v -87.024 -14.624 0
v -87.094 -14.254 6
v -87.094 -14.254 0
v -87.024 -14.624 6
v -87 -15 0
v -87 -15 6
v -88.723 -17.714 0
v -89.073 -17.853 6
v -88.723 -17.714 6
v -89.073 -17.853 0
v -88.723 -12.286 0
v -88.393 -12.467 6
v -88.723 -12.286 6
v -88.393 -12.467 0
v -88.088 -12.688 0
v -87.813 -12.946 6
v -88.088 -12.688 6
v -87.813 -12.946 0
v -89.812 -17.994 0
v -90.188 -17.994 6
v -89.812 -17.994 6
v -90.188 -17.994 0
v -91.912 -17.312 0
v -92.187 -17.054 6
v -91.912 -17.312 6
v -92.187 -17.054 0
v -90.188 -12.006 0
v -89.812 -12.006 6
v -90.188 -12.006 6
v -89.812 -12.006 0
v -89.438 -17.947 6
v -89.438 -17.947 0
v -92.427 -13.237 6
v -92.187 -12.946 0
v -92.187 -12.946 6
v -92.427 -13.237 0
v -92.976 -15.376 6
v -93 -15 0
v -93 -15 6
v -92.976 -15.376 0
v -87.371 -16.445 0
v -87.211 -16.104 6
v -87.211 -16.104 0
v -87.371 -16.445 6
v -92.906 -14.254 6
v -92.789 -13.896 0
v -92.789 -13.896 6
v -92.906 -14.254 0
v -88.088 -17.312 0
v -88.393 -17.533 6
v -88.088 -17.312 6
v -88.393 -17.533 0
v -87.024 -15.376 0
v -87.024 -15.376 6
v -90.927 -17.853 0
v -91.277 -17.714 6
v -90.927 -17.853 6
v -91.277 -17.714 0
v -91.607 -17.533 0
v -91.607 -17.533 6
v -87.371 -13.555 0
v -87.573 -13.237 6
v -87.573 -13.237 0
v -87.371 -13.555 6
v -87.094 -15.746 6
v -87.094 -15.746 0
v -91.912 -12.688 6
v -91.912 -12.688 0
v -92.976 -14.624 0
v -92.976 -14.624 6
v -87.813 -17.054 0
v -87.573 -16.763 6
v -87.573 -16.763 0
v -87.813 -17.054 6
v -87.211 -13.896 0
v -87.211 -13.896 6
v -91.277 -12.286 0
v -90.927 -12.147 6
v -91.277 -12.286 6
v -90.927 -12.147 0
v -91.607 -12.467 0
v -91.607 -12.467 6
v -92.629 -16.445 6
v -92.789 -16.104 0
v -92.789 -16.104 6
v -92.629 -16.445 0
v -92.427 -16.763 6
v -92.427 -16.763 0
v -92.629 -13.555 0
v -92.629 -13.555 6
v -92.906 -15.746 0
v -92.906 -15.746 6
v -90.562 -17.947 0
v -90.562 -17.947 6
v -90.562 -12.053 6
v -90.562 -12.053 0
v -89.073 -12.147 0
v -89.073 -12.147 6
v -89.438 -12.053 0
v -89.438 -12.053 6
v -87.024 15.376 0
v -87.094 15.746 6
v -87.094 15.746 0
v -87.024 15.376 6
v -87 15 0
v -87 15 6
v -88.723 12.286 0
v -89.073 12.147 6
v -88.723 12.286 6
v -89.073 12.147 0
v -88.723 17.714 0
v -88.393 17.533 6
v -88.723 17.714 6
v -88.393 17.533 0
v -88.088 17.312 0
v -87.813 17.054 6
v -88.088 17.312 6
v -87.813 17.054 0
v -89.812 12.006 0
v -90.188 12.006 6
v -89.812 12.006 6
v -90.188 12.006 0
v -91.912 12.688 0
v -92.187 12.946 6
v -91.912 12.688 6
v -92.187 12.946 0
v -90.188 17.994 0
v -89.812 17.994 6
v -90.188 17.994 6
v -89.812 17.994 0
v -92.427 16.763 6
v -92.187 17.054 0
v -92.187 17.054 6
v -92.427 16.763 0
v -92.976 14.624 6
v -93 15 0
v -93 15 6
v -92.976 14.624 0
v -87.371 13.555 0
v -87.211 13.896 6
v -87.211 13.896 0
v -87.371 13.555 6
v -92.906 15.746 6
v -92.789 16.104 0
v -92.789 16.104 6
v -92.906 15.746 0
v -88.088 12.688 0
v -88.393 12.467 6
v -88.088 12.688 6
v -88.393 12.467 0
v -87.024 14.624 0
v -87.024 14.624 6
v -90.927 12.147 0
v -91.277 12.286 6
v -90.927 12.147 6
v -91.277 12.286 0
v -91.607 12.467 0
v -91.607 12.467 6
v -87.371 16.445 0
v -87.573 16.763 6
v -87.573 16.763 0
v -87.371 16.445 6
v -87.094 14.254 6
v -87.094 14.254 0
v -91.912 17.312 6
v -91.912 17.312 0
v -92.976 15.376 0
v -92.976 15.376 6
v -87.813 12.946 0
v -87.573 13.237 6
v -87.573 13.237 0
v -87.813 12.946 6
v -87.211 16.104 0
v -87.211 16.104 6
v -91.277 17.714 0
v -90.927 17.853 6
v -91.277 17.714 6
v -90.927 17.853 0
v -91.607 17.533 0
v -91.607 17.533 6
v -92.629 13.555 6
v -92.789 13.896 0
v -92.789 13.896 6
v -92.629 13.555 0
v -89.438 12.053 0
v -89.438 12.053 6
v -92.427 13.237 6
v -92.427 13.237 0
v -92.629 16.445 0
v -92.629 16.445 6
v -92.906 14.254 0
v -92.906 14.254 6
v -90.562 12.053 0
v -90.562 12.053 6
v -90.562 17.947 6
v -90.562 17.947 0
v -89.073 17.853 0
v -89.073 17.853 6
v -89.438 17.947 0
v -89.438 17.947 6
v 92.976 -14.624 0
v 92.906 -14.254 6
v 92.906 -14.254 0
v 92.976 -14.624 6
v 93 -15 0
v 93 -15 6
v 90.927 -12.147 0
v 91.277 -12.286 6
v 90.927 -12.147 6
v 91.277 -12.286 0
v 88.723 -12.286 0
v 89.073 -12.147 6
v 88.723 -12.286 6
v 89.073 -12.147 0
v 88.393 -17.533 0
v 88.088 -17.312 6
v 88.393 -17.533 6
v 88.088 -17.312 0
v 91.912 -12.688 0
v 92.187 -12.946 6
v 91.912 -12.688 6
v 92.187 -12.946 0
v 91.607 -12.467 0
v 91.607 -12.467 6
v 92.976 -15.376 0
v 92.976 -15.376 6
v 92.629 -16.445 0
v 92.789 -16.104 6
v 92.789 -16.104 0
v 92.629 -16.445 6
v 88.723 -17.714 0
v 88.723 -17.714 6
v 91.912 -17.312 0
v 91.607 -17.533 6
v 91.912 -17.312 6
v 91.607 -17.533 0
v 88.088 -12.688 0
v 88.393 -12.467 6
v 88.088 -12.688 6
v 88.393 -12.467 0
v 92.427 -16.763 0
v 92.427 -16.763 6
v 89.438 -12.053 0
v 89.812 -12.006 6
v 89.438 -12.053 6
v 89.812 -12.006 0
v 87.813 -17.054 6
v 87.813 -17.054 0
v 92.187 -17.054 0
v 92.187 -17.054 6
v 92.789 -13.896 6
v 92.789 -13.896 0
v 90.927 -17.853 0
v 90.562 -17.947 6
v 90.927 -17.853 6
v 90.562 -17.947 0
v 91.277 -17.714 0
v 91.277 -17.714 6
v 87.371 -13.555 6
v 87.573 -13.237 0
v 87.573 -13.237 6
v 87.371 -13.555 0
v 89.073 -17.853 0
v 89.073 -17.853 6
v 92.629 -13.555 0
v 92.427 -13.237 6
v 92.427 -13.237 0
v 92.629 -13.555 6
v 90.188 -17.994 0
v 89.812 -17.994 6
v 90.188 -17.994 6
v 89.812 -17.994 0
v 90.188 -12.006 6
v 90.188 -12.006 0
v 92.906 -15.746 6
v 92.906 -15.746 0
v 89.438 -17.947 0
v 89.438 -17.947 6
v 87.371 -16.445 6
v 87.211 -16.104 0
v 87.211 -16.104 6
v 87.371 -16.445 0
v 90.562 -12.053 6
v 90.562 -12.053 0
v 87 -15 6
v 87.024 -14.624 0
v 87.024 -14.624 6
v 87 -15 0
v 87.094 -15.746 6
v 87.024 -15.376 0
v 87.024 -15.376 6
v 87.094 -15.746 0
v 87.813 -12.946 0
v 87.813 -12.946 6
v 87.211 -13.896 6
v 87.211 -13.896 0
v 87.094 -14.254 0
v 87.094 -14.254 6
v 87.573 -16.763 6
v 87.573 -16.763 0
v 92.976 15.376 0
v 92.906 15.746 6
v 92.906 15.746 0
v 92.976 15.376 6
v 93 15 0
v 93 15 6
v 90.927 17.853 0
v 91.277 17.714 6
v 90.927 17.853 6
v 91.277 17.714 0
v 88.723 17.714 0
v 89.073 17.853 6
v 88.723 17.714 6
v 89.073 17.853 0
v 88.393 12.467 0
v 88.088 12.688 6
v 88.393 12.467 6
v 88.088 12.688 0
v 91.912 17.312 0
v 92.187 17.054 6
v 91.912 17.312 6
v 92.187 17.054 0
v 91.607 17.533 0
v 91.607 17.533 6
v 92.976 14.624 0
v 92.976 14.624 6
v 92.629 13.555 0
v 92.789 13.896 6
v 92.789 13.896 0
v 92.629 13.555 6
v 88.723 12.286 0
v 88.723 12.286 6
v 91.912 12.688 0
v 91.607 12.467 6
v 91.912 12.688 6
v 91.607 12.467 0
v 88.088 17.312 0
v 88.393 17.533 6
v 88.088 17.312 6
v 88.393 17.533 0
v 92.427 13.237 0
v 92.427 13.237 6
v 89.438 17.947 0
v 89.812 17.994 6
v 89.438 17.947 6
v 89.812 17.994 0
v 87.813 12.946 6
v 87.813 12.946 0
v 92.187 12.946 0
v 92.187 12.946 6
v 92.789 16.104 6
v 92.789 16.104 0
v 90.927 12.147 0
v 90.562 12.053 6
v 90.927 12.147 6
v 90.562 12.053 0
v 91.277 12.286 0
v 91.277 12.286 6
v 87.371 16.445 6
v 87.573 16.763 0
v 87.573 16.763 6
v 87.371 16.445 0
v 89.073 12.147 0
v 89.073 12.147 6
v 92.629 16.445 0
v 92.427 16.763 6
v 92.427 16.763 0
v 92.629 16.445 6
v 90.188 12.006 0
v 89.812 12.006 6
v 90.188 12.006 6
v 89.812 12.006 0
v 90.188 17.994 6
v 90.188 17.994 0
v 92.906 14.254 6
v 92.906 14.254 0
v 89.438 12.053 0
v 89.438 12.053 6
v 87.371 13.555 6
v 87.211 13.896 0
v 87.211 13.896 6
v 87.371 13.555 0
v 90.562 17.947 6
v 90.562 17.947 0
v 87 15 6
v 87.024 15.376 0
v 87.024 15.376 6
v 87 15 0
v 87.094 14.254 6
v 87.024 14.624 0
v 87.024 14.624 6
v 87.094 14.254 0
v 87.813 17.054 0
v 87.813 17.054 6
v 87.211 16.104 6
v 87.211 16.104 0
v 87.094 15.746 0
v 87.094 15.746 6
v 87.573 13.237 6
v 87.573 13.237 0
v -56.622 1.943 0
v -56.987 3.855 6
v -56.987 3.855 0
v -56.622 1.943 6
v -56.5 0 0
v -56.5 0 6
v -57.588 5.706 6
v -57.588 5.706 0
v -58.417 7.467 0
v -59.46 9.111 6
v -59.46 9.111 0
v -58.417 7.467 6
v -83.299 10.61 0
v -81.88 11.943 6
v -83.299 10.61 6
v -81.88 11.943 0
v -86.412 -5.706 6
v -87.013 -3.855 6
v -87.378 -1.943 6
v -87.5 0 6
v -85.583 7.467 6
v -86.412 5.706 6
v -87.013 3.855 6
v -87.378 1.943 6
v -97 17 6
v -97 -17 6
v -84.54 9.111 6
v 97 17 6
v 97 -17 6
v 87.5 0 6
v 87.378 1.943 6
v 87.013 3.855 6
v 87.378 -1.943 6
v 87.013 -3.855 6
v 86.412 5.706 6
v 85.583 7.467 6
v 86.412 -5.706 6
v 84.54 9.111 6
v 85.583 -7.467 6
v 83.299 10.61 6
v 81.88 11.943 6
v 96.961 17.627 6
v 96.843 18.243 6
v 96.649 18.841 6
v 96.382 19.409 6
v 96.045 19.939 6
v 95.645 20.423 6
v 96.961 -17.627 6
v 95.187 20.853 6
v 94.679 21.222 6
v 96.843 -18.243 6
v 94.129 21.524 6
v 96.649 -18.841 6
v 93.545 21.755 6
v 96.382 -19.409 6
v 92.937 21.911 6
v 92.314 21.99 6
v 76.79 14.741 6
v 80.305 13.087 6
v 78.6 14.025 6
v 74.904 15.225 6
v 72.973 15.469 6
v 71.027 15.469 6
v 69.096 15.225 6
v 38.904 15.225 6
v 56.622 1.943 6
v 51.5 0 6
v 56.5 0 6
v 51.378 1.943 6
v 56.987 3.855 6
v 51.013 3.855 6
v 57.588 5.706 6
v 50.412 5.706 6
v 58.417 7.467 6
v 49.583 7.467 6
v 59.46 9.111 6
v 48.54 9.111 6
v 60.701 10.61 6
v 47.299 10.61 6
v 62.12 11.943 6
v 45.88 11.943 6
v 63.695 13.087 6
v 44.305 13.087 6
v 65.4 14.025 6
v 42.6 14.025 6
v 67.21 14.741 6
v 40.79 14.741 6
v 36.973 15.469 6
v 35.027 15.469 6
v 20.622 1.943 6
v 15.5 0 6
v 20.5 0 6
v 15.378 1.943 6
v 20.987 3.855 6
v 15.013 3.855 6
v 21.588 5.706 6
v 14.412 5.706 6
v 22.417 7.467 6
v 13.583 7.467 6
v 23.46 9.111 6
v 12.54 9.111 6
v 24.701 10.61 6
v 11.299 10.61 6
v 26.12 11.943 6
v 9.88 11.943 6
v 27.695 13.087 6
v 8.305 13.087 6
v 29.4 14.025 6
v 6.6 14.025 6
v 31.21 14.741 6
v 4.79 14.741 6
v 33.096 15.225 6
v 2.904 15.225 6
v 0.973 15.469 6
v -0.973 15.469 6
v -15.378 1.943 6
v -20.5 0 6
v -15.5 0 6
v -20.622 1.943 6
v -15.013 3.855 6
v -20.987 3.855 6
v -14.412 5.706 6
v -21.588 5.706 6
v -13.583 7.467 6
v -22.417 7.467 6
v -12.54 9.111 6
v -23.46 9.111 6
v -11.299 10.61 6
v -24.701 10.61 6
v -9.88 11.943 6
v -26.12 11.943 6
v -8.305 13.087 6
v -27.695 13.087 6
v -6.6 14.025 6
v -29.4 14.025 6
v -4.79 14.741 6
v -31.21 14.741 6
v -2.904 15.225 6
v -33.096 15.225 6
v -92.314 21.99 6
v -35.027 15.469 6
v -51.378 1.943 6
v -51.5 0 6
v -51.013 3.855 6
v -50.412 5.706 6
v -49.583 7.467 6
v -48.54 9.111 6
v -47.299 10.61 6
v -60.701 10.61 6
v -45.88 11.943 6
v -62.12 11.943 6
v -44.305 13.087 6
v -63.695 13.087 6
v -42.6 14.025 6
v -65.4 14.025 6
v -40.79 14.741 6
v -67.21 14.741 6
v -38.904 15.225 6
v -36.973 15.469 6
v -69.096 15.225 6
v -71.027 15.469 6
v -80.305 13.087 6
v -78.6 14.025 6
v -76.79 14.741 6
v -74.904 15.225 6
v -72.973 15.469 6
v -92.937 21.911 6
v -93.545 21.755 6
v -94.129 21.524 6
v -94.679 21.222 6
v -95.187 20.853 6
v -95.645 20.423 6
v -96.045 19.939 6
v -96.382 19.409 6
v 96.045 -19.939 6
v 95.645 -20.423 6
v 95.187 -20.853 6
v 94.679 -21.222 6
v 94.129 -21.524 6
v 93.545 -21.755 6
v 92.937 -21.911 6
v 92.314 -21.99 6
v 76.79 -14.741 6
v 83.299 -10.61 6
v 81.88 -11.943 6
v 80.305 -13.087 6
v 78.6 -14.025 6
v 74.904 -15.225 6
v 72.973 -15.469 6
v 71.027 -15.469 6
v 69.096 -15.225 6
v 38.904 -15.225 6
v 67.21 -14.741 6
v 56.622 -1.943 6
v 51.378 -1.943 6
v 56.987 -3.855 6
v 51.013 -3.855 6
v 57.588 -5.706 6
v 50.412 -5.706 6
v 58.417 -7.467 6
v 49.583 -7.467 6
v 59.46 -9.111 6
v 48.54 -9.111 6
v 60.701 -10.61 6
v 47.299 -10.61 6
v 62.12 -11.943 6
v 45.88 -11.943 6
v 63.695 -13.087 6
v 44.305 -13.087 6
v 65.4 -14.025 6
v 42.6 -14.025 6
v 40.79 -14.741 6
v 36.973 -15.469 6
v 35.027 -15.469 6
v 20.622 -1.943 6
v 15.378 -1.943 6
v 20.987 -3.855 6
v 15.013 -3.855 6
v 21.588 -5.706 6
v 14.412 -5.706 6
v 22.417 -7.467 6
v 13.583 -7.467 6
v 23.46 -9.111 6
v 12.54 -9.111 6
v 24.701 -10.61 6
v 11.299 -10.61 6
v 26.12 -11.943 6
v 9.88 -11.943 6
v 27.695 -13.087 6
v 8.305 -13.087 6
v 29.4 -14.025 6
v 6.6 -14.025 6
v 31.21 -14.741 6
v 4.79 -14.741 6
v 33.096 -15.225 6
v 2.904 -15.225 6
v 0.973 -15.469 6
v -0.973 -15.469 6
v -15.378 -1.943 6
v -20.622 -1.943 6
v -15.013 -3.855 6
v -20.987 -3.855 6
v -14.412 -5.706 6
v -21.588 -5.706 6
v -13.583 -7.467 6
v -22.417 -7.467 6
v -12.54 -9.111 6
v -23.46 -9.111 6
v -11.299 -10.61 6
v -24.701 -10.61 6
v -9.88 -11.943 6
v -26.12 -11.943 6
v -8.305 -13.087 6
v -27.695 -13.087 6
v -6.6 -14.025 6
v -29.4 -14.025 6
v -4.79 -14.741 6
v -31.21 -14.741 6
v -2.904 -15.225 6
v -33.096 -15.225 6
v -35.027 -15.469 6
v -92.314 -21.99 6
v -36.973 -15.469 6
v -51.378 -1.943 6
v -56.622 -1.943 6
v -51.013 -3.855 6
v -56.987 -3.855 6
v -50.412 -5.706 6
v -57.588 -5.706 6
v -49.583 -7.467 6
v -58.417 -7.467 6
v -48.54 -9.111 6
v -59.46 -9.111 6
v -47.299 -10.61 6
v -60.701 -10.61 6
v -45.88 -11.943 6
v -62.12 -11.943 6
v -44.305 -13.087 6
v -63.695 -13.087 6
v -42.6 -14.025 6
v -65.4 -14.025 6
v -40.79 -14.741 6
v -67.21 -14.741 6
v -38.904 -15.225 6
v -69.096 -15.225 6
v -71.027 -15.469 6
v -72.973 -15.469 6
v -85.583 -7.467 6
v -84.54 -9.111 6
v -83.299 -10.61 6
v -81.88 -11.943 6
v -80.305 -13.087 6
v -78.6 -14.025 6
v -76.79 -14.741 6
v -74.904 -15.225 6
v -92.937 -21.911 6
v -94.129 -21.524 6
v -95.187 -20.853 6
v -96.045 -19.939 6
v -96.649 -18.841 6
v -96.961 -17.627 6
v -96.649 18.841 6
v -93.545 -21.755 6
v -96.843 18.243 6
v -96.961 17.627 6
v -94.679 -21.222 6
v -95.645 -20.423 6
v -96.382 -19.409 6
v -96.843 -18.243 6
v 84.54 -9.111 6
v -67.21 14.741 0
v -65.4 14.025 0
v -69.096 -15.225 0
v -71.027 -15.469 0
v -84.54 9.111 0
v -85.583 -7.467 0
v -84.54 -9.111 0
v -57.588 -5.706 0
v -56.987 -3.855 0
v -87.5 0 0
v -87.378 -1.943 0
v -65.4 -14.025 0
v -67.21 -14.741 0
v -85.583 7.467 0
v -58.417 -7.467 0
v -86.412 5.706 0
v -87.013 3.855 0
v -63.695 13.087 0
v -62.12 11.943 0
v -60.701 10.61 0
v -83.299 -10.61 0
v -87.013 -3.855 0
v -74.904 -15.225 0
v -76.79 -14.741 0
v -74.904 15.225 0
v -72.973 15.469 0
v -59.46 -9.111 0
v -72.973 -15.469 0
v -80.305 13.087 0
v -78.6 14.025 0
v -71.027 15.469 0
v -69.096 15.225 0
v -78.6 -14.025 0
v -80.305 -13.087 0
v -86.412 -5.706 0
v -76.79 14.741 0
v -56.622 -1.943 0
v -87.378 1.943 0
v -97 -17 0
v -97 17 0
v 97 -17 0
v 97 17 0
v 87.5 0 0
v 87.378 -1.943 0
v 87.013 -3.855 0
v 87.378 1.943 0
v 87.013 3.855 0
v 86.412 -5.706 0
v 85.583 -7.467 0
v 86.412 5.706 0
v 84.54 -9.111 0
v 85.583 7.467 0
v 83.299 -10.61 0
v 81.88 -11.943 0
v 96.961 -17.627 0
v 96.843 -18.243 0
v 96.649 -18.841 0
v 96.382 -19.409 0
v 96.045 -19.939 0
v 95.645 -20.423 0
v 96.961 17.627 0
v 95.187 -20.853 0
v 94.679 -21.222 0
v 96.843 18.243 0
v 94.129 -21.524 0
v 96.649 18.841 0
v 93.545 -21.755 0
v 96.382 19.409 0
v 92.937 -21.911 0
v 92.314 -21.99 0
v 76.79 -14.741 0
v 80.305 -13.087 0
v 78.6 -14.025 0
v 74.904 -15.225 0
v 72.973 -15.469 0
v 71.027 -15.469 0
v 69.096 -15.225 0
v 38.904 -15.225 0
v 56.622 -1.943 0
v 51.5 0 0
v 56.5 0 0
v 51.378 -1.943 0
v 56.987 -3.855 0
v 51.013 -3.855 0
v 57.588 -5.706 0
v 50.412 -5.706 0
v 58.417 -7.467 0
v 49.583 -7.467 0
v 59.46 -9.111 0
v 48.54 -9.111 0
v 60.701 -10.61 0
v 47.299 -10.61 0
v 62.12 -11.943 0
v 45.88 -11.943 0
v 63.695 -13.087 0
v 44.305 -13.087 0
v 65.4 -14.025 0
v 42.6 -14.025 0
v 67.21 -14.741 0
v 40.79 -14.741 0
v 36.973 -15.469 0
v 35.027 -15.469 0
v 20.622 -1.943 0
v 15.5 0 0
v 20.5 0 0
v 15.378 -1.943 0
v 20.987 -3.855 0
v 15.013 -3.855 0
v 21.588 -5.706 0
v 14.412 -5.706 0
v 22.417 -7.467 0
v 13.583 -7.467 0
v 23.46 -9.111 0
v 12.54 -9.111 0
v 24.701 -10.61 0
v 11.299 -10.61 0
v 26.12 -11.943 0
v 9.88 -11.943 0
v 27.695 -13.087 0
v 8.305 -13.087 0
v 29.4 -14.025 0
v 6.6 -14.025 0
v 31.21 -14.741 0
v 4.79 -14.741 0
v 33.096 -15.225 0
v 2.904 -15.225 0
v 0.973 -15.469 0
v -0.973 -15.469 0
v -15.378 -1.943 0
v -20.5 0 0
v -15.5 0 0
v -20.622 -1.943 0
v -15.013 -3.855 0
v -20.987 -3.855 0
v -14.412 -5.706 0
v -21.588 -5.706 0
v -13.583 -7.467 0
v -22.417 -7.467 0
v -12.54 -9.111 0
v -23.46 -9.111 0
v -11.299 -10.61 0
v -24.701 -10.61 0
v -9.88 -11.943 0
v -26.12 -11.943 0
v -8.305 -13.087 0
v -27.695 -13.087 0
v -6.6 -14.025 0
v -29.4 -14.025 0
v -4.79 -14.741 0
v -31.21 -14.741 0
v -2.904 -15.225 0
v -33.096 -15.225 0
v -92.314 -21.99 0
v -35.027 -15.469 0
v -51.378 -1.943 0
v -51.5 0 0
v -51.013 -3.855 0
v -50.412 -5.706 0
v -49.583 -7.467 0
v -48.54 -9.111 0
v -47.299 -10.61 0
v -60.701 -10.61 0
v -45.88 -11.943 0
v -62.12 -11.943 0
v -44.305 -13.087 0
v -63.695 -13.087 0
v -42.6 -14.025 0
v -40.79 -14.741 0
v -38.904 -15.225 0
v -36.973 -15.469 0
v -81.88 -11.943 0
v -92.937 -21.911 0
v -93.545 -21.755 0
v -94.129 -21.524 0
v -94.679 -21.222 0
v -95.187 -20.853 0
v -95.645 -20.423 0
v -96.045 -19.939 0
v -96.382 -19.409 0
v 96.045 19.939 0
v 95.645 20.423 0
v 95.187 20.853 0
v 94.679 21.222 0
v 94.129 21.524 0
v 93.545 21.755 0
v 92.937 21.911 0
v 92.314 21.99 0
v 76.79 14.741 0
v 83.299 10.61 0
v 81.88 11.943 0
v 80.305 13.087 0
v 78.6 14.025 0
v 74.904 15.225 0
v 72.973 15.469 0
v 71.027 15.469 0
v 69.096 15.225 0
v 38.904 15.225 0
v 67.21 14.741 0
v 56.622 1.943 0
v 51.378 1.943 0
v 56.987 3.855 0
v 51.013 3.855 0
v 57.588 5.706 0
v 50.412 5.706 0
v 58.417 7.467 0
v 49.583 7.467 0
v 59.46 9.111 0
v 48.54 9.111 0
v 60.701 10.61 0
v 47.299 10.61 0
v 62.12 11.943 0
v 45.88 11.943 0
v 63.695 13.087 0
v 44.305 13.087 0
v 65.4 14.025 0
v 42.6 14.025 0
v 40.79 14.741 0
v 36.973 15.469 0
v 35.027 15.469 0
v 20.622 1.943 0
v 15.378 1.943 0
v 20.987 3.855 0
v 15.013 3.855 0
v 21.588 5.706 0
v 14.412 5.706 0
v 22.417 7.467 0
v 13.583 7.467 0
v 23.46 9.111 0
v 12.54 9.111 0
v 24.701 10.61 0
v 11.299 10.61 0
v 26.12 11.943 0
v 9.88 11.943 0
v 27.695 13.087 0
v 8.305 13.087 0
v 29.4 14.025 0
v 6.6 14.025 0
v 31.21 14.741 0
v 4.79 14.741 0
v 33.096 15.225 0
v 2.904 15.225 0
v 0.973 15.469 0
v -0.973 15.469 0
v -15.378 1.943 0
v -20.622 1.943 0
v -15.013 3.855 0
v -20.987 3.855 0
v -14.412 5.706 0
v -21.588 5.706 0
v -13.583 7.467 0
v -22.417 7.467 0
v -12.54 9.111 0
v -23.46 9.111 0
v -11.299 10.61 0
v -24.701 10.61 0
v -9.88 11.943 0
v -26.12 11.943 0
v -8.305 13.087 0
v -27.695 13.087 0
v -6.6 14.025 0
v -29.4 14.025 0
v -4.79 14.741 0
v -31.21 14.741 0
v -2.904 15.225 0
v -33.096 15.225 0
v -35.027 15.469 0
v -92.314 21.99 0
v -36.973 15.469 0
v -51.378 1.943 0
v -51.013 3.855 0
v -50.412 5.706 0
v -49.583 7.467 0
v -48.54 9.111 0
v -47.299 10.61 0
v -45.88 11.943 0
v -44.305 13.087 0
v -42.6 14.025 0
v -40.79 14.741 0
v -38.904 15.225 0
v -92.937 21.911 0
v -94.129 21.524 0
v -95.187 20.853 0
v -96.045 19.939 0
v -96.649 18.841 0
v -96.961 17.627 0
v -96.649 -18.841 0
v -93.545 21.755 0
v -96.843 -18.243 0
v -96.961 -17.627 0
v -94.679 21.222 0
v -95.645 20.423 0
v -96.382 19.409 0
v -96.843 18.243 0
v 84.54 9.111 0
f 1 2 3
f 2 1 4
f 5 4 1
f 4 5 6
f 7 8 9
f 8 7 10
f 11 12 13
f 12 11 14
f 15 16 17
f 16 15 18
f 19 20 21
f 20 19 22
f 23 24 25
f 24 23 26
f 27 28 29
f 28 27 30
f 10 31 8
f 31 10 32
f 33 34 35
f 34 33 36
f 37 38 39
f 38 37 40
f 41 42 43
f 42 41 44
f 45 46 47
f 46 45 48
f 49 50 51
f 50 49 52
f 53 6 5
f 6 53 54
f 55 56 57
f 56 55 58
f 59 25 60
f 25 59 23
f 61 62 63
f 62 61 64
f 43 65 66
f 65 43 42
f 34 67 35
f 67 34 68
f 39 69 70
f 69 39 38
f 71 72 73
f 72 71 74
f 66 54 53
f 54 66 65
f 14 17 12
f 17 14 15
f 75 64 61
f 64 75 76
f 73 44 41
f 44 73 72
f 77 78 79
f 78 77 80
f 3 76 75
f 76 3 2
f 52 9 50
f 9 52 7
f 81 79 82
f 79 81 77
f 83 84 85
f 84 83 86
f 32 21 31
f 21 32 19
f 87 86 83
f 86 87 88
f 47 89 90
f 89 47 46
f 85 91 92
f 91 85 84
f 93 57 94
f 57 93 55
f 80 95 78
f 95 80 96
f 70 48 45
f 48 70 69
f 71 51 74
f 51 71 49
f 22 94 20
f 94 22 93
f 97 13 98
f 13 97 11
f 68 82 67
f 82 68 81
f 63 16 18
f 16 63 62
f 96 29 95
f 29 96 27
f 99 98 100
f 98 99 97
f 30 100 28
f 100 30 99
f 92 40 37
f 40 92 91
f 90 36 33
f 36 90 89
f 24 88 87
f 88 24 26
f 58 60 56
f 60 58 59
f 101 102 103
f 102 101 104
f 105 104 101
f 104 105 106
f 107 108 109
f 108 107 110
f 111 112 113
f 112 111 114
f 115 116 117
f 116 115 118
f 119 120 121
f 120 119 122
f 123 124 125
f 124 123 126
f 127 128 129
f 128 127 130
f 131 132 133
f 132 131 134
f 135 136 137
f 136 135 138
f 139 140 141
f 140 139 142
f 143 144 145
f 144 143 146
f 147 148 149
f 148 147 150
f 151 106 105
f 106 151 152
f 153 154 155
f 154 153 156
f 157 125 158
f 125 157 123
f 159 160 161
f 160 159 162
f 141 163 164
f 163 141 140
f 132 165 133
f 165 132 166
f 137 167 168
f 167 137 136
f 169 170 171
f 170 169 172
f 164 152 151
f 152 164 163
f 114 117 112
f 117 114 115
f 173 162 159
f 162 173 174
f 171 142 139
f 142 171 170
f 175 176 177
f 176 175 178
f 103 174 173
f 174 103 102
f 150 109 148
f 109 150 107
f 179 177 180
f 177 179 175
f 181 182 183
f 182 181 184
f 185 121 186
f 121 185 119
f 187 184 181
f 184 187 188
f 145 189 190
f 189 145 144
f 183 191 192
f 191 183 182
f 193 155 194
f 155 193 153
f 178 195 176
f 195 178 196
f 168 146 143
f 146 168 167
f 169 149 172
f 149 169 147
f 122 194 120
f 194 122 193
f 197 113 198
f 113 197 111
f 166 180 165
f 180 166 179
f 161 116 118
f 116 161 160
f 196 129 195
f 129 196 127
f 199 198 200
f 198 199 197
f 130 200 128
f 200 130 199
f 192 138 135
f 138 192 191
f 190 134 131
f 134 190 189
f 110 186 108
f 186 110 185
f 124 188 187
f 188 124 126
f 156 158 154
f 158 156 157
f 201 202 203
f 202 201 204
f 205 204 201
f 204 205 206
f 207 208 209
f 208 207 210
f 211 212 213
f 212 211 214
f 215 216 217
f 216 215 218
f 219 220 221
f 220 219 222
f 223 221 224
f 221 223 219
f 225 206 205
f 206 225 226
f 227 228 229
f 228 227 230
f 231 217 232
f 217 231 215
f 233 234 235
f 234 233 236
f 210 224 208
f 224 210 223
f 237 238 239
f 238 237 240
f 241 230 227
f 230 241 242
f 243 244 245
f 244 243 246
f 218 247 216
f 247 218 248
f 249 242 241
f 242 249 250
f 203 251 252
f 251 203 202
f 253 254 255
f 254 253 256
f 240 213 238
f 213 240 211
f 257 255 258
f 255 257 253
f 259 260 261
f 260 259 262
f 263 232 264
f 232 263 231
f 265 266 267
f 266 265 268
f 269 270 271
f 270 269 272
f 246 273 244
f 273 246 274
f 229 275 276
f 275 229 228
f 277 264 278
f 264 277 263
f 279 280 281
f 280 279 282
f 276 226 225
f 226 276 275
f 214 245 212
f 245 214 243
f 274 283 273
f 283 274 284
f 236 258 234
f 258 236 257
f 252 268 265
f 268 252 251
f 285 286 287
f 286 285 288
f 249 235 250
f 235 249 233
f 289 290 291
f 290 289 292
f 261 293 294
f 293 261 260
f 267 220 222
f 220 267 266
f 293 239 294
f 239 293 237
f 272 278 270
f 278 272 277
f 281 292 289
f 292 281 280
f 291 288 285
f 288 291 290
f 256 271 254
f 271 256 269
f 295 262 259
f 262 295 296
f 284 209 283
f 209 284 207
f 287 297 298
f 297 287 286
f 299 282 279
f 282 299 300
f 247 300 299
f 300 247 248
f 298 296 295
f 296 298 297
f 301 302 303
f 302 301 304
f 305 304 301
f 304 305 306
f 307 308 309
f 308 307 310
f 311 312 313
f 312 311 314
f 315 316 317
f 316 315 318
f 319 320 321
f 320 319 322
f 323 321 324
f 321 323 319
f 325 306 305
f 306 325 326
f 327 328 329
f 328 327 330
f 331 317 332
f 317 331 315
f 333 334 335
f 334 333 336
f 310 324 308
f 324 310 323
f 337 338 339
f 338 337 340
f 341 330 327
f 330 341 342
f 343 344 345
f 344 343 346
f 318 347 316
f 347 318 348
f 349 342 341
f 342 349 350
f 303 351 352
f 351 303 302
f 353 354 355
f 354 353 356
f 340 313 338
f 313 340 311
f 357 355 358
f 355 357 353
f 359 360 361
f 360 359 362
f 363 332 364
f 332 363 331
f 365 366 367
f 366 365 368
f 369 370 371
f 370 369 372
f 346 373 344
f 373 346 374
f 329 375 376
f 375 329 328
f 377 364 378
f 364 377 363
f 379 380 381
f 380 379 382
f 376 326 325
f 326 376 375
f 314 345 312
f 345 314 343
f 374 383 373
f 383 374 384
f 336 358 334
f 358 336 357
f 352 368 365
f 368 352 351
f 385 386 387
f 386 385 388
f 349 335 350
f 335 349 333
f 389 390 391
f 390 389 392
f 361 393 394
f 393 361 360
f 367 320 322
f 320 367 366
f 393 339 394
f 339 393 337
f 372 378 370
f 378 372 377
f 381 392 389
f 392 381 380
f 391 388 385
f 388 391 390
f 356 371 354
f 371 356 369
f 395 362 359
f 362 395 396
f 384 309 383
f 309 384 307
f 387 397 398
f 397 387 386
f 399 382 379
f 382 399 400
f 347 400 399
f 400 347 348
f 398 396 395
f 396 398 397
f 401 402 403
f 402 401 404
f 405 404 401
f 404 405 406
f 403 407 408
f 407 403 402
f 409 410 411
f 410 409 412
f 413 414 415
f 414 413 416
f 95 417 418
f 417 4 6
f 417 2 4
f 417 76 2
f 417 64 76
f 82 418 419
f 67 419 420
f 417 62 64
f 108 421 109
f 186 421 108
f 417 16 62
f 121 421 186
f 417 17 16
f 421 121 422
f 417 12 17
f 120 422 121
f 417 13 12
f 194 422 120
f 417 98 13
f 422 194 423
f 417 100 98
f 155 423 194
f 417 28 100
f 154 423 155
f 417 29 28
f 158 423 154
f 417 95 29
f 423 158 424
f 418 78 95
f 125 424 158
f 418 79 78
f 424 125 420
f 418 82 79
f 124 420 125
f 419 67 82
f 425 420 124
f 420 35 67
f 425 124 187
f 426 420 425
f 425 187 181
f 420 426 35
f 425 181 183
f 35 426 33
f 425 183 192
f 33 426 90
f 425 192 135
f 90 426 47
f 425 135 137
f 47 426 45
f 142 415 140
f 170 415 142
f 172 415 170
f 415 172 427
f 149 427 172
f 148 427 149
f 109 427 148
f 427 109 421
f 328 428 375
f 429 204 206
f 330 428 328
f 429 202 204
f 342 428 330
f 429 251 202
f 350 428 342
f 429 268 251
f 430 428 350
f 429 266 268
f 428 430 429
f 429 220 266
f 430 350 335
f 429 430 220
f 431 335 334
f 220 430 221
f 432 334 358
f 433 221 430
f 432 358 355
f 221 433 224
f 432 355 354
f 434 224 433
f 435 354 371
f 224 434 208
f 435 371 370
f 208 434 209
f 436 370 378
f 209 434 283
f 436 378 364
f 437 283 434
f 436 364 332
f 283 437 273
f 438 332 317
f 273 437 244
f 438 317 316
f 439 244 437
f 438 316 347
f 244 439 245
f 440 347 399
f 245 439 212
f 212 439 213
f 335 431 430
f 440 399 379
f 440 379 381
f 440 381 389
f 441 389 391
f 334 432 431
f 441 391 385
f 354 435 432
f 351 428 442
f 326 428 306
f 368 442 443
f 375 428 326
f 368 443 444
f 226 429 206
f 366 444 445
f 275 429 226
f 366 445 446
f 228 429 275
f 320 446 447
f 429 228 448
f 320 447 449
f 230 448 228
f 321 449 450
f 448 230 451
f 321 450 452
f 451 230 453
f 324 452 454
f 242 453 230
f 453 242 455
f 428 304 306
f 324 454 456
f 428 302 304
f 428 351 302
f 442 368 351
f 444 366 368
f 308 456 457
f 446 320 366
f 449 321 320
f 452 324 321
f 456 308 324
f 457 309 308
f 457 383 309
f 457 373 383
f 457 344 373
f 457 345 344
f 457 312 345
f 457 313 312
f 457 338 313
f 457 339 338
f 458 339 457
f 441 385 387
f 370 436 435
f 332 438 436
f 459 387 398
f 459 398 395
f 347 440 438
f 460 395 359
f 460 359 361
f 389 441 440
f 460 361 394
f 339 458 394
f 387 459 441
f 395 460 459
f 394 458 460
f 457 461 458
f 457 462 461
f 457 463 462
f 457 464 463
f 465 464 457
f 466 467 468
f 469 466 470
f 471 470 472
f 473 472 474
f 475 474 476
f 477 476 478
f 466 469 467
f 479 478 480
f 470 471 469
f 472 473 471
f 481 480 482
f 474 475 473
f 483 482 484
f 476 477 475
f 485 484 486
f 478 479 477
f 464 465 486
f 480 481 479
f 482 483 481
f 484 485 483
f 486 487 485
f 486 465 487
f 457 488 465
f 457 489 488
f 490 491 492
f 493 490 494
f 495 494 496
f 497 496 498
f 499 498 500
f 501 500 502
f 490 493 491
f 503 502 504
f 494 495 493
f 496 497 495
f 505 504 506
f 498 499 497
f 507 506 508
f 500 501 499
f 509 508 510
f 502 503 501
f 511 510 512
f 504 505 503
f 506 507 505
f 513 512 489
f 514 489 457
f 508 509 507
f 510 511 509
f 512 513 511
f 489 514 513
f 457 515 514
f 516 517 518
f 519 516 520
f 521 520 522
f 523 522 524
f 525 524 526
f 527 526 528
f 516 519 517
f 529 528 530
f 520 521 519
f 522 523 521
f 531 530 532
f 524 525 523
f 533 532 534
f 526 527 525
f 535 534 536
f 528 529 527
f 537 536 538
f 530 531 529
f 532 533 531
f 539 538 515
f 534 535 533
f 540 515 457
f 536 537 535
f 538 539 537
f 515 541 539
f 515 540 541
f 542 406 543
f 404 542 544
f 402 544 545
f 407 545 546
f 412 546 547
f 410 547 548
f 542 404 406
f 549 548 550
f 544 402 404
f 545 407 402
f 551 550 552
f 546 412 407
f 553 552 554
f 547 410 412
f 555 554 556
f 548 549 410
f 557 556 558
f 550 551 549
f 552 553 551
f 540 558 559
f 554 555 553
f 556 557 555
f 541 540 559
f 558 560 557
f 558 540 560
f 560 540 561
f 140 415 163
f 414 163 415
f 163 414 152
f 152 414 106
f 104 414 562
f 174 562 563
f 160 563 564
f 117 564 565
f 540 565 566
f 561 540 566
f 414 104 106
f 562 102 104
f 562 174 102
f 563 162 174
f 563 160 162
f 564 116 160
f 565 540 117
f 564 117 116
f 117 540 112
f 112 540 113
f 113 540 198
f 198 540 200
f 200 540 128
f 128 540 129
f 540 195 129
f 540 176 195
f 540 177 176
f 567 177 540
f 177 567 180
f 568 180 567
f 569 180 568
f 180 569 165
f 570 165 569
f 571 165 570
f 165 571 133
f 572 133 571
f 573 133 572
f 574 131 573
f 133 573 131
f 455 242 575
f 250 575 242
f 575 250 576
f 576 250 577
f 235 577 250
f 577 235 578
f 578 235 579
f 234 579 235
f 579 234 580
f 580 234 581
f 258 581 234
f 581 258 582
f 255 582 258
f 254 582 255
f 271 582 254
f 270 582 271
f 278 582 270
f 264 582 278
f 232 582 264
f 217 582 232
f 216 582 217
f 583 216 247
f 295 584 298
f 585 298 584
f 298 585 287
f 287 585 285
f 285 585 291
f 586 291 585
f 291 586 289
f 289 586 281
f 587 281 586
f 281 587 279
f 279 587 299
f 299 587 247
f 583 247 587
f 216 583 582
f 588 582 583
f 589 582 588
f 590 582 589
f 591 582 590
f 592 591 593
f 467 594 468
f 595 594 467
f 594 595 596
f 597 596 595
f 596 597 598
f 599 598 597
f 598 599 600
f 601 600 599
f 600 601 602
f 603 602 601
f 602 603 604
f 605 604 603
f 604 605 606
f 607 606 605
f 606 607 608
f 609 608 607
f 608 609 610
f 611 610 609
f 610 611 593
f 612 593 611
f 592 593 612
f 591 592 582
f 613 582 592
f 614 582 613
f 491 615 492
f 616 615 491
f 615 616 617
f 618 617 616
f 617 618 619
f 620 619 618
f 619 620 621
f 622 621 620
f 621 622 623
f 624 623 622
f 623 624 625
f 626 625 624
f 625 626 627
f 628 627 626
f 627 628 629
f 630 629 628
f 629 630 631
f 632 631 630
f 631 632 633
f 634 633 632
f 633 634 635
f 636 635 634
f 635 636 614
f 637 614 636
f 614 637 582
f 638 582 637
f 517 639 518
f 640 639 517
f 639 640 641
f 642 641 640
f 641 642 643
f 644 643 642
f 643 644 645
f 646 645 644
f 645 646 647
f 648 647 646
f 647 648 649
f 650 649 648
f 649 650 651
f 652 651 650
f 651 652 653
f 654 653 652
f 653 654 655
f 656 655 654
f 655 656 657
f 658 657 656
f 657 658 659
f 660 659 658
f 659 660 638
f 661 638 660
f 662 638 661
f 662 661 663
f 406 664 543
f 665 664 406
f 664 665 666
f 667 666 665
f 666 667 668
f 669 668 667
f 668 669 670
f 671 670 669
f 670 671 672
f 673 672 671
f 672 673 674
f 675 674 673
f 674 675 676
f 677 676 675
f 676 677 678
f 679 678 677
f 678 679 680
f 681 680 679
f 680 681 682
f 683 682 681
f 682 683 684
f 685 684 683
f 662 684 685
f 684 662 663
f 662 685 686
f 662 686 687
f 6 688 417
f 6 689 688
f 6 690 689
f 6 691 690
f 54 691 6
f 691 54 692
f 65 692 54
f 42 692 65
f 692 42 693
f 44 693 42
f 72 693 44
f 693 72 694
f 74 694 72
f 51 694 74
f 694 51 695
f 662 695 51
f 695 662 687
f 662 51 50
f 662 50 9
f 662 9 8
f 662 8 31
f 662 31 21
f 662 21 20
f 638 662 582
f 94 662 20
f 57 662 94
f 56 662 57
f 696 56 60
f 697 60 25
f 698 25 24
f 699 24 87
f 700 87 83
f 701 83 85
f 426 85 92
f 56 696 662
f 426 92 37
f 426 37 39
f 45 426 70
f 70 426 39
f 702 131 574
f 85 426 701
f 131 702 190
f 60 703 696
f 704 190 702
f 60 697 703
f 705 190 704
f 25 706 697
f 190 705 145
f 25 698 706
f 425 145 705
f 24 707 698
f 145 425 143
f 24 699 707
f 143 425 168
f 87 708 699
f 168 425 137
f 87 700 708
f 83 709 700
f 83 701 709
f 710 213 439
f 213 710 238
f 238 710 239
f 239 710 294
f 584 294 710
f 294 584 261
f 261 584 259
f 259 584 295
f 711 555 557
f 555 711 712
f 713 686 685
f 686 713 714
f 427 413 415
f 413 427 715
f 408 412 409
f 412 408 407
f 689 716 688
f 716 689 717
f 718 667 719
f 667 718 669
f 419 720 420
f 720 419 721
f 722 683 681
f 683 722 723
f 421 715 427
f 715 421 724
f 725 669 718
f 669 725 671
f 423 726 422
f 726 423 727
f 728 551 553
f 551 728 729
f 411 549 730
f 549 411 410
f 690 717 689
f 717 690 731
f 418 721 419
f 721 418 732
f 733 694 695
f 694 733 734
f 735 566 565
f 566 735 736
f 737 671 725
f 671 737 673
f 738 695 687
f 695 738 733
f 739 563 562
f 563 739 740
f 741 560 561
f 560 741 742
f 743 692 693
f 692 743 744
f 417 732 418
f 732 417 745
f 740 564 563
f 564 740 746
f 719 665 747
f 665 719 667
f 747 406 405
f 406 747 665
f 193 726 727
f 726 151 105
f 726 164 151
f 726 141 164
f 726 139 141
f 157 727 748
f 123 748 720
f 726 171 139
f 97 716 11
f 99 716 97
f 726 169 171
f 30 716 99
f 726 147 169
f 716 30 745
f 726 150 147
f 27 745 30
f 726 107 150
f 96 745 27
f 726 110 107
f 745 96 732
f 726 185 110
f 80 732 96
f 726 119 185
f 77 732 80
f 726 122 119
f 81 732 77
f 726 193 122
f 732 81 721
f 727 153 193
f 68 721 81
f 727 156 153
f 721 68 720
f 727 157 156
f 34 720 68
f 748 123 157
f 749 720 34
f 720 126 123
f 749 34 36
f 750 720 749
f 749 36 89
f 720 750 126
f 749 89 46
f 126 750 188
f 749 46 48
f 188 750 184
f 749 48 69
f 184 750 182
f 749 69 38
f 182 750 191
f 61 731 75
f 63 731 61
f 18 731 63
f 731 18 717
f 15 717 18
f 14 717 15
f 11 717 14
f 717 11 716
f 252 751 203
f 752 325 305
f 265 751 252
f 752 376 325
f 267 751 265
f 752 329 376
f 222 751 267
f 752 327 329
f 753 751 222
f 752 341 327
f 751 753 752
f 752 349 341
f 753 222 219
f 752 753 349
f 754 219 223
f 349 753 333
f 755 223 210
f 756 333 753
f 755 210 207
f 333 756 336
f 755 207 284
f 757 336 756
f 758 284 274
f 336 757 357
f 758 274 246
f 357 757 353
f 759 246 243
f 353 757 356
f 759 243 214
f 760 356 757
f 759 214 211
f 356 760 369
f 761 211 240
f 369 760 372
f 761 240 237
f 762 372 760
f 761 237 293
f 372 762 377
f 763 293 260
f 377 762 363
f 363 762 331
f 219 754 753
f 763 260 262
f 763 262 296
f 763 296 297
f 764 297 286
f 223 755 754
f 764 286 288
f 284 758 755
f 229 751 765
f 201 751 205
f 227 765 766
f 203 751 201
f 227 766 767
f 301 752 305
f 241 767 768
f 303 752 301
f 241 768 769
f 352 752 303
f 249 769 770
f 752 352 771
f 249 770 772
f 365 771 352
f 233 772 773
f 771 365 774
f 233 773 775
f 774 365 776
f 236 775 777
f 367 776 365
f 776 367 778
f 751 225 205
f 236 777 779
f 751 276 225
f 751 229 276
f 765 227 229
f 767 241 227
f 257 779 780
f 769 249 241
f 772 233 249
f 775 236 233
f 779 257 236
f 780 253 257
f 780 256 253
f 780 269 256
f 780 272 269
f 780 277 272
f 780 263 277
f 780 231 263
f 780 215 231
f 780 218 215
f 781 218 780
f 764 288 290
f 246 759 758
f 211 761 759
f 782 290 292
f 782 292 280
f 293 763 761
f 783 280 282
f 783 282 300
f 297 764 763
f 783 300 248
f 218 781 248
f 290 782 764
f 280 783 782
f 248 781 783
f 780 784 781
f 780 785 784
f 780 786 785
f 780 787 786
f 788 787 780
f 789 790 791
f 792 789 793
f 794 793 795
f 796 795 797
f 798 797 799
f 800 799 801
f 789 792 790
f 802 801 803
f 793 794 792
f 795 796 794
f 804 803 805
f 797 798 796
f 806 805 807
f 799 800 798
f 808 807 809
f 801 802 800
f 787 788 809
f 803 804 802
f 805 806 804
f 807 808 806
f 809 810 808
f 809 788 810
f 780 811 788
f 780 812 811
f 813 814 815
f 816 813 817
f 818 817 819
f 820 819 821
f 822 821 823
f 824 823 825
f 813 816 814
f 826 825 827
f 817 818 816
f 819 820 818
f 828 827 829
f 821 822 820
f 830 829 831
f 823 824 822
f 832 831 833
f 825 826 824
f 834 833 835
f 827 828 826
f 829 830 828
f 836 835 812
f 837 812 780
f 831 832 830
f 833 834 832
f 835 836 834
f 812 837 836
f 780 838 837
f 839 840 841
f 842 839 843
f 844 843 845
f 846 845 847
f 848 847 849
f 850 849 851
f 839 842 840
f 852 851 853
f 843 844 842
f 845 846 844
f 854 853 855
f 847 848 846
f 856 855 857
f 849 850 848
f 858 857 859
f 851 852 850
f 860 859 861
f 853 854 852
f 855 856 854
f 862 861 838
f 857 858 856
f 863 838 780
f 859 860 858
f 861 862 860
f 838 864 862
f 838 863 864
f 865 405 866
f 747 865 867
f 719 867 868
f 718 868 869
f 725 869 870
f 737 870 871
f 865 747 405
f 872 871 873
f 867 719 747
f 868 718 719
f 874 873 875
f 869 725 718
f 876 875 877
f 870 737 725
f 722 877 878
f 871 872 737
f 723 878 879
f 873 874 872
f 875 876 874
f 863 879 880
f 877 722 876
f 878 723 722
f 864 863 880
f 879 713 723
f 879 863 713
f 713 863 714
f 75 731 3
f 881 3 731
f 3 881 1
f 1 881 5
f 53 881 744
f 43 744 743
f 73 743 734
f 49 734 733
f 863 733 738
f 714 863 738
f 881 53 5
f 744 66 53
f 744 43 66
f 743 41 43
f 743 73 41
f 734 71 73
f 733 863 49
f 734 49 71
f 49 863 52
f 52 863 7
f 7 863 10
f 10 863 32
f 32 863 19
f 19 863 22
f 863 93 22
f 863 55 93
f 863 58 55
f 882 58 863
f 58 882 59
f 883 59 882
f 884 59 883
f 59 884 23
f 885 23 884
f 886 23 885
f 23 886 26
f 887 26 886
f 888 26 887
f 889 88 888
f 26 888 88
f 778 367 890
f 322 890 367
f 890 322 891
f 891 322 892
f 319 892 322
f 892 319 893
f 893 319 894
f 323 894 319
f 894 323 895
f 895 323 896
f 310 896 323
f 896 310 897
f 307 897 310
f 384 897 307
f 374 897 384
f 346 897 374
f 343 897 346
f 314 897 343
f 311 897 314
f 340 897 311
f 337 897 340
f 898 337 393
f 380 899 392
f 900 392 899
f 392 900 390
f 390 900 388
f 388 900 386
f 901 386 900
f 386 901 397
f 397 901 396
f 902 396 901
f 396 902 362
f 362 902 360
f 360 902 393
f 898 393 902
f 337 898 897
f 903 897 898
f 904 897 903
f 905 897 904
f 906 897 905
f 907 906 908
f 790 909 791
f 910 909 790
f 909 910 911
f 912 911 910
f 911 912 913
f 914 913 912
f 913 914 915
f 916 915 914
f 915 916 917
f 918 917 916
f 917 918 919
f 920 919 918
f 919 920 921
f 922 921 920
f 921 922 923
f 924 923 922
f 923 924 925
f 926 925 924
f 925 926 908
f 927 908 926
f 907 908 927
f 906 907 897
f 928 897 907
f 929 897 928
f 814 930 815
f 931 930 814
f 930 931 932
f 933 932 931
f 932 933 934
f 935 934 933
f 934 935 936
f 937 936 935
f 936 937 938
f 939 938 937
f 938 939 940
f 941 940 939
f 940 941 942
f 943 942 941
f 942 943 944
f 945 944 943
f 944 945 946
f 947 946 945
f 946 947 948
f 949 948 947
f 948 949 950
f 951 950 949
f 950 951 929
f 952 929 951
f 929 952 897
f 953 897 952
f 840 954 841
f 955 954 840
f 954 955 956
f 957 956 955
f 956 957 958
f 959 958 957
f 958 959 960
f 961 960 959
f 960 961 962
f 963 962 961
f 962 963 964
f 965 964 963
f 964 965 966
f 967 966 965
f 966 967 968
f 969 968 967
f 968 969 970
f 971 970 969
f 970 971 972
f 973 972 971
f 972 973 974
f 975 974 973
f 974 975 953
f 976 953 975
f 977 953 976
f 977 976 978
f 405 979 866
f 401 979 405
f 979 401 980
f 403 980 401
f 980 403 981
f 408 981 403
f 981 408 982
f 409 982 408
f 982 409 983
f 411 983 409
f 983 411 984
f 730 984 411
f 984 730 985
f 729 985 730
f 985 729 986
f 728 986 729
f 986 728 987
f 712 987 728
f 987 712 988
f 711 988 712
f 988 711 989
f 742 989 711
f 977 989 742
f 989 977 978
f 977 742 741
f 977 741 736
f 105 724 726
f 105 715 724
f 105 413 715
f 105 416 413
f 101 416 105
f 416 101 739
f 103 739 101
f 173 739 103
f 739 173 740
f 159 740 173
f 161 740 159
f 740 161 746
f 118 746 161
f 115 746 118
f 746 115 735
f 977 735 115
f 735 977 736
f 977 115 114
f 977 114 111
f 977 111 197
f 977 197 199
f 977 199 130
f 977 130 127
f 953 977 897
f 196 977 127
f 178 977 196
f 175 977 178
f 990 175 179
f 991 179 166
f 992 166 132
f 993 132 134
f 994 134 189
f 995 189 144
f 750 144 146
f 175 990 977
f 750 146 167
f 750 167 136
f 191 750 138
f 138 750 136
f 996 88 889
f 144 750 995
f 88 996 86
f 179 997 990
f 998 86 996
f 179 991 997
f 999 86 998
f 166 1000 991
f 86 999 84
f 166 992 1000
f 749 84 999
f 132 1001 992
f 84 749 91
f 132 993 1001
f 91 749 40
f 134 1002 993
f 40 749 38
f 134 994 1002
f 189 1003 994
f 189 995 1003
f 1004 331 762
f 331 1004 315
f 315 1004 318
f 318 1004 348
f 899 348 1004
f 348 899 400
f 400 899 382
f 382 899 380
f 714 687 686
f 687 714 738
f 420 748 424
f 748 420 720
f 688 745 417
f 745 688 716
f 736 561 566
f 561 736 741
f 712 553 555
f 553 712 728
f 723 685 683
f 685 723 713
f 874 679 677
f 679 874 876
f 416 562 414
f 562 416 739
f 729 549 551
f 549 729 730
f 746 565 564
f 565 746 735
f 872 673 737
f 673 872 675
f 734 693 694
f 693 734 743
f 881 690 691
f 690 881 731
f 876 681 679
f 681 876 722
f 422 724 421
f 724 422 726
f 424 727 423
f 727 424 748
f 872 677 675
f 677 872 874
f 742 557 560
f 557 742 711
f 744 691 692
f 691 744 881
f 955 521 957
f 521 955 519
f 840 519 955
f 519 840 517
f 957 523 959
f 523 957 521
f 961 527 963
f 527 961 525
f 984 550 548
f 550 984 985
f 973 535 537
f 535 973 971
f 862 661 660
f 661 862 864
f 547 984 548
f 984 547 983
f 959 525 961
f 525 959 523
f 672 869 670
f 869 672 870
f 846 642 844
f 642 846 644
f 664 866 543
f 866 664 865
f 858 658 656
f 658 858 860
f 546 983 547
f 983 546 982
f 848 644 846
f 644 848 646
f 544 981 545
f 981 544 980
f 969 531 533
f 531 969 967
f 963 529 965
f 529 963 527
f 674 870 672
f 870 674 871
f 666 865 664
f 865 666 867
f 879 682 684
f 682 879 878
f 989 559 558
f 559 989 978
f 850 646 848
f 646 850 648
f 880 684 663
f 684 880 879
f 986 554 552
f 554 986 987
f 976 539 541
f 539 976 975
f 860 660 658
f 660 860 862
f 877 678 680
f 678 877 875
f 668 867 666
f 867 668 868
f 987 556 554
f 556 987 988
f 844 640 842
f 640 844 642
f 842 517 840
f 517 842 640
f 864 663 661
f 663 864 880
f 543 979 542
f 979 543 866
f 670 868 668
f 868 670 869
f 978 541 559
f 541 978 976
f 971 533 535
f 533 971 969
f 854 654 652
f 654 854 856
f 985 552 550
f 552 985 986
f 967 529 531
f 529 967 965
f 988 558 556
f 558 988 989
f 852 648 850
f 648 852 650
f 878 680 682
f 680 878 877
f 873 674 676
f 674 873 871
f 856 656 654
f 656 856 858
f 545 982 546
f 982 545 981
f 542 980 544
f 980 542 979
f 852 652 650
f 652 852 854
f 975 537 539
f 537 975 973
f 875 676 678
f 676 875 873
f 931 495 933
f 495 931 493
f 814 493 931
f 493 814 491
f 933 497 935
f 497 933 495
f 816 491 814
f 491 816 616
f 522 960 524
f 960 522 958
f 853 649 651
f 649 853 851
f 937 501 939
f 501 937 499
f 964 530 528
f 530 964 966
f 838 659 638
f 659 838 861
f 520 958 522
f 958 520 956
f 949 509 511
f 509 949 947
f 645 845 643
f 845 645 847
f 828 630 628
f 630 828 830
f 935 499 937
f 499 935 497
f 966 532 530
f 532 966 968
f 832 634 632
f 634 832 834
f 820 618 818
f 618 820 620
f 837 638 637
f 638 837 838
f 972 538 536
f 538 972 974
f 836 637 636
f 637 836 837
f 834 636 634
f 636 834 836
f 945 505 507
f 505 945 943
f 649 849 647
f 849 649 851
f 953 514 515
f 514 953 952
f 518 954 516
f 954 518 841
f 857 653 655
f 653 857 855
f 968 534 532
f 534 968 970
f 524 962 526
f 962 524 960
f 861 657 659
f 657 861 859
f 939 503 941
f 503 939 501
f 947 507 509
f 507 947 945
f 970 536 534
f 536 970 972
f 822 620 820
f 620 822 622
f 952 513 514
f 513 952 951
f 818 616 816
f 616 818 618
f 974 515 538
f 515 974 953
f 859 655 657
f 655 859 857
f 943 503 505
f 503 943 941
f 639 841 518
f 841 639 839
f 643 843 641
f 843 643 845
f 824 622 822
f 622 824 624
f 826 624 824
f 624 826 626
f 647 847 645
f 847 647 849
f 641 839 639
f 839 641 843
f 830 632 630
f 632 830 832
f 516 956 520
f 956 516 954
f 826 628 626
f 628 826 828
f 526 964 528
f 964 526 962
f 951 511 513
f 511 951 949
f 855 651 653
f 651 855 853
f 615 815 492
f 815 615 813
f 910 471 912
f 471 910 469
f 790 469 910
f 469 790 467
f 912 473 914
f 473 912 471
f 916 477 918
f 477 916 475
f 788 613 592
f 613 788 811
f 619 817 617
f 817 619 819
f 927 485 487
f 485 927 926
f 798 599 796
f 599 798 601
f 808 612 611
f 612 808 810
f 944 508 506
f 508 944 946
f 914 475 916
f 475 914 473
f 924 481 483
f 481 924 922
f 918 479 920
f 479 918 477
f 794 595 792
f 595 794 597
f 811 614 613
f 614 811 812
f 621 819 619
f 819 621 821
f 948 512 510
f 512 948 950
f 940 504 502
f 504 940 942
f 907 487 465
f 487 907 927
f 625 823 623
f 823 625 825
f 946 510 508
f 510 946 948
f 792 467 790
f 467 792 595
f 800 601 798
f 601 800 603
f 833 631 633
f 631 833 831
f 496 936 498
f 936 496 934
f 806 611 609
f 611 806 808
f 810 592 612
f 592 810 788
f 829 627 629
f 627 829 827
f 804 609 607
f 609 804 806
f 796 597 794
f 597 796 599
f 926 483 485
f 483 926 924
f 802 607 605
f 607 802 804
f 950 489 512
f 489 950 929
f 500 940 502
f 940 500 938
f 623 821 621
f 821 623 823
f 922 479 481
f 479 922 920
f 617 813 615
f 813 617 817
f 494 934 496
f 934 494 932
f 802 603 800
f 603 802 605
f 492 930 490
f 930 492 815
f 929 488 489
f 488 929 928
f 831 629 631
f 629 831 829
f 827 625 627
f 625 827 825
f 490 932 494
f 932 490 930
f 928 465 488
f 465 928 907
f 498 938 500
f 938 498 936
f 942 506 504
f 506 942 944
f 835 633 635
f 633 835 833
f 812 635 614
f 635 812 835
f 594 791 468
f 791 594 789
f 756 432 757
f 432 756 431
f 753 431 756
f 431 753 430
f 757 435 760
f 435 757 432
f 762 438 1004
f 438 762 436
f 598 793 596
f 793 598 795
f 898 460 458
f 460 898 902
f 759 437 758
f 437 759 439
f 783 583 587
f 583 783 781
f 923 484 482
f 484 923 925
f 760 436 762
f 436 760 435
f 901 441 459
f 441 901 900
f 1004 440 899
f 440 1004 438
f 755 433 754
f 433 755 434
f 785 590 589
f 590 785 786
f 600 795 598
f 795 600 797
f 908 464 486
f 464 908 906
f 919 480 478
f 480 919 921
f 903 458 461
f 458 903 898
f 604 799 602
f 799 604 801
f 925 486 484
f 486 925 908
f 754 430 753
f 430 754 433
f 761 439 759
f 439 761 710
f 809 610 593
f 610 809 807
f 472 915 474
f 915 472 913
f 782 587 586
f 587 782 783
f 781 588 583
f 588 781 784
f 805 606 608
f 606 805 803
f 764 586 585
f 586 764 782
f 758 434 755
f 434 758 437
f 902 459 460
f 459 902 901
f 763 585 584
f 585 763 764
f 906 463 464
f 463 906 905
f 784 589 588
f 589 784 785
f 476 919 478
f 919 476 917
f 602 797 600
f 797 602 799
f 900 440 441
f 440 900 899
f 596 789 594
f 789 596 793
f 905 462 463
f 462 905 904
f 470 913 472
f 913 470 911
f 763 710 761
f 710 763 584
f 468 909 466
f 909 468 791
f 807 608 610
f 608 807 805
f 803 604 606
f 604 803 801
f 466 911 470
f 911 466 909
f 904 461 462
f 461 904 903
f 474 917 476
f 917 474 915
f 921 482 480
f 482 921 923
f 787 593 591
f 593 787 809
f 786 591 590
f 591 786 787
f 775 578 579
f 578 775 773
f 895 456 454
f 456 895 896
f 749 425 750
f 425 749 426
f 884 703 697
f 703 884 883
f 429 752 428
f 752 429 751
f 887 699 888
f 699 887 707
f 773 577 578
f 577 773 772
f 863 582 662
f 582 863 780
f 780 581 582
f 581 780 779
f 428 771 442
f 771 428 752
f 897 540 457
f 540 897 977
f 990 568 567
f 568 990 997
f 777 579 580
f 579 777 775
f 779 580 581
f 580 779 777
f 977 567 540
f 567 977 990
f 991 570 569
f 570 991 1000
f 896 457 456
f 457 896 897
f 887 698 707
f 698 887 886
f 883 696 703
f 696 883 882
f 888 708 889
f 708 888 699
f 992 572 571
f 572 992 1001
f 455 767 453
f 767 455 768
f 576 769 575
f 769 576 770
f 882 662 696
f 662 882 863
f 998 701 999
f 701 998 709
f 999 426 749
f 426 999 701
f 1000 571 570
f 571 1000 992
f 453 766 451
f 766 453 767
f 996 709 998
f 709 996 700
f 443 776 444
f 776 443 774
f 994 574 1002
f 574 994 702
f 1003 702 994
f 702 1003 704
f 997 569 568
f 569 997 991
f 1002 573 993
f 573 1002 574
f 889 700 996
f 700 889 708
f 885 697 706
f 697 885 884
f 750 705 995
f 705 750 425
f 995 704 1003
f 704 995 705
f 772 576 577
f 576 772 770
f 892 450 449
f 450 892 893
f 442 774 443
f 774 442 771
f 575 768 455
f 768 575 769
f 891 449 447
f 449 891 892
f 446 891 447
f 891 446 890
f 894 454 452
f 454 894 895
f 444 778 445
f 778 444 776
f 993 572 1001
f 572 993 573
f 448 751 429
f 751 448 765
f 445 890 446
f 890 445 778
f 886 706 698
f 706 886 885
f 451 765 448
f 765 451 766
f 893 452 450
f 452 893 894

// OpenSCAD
$fn = 50;


difference() {
	union() {
		hull() {
			translate(v = [-92.0000000000, 17.0000000000, 0]) {
				cylinder(h = 6, r = 5);
			}
			translate(v = [92.0000000000, 17.0000000000, 0]) {
				cylinder(h = 6, r = 5);
			}
			translate(v = [-92.0000000000, -17.0000000000, 0]) {
				cylinder(h = 6, r = 5);
			}
			translate(v = [92.0000000000, -17.0000000000, 0]) {
				cylinder(h = 6, r = 5);
			}
		}
	}
	union() {
		#translate(v = [-90.0000000000, -15.0000000000, -100.0000000000]) {
			cylinder(h = 200, r = 3.0000000000);
		}
		#translate(v = [-90.0000000000, 15.0000000000, -100.0000000000]) {
			cylinder(h = 200, r = 3.0000000000);
		}
		#translate(v = [90.0000000000, -15.0000000000, -100.0000000000]) {
			cylinder(h = 200, r = 3.0000000000);
		}
		#translate(v = [90.0000000000, 15.0000000000, -100.0000000000]) {
			cylinder(h = 200, r = 3.0000000000);
		}
		#translate(v = [-72.0000000000, 0, 0]) {
			cylinder(h = 6, r = 15.5000000000);
		}
		#translate(v = [-36.0000000000, 0, 0]) {
			cylinder(h = 6, r = 15.5000000000);
		}
		#cylinder(h = 6, r = 15.5000000000);
		#translate(v = [36.0000000000, 0, 0]) {
			cylinder(h = 6, r = 15.5000000000);
		}
		#translate(v = [72.0000000000, 0, 0]) {
			cylinder(h = 6, r = 15.5000000000);
		}
	}
}
